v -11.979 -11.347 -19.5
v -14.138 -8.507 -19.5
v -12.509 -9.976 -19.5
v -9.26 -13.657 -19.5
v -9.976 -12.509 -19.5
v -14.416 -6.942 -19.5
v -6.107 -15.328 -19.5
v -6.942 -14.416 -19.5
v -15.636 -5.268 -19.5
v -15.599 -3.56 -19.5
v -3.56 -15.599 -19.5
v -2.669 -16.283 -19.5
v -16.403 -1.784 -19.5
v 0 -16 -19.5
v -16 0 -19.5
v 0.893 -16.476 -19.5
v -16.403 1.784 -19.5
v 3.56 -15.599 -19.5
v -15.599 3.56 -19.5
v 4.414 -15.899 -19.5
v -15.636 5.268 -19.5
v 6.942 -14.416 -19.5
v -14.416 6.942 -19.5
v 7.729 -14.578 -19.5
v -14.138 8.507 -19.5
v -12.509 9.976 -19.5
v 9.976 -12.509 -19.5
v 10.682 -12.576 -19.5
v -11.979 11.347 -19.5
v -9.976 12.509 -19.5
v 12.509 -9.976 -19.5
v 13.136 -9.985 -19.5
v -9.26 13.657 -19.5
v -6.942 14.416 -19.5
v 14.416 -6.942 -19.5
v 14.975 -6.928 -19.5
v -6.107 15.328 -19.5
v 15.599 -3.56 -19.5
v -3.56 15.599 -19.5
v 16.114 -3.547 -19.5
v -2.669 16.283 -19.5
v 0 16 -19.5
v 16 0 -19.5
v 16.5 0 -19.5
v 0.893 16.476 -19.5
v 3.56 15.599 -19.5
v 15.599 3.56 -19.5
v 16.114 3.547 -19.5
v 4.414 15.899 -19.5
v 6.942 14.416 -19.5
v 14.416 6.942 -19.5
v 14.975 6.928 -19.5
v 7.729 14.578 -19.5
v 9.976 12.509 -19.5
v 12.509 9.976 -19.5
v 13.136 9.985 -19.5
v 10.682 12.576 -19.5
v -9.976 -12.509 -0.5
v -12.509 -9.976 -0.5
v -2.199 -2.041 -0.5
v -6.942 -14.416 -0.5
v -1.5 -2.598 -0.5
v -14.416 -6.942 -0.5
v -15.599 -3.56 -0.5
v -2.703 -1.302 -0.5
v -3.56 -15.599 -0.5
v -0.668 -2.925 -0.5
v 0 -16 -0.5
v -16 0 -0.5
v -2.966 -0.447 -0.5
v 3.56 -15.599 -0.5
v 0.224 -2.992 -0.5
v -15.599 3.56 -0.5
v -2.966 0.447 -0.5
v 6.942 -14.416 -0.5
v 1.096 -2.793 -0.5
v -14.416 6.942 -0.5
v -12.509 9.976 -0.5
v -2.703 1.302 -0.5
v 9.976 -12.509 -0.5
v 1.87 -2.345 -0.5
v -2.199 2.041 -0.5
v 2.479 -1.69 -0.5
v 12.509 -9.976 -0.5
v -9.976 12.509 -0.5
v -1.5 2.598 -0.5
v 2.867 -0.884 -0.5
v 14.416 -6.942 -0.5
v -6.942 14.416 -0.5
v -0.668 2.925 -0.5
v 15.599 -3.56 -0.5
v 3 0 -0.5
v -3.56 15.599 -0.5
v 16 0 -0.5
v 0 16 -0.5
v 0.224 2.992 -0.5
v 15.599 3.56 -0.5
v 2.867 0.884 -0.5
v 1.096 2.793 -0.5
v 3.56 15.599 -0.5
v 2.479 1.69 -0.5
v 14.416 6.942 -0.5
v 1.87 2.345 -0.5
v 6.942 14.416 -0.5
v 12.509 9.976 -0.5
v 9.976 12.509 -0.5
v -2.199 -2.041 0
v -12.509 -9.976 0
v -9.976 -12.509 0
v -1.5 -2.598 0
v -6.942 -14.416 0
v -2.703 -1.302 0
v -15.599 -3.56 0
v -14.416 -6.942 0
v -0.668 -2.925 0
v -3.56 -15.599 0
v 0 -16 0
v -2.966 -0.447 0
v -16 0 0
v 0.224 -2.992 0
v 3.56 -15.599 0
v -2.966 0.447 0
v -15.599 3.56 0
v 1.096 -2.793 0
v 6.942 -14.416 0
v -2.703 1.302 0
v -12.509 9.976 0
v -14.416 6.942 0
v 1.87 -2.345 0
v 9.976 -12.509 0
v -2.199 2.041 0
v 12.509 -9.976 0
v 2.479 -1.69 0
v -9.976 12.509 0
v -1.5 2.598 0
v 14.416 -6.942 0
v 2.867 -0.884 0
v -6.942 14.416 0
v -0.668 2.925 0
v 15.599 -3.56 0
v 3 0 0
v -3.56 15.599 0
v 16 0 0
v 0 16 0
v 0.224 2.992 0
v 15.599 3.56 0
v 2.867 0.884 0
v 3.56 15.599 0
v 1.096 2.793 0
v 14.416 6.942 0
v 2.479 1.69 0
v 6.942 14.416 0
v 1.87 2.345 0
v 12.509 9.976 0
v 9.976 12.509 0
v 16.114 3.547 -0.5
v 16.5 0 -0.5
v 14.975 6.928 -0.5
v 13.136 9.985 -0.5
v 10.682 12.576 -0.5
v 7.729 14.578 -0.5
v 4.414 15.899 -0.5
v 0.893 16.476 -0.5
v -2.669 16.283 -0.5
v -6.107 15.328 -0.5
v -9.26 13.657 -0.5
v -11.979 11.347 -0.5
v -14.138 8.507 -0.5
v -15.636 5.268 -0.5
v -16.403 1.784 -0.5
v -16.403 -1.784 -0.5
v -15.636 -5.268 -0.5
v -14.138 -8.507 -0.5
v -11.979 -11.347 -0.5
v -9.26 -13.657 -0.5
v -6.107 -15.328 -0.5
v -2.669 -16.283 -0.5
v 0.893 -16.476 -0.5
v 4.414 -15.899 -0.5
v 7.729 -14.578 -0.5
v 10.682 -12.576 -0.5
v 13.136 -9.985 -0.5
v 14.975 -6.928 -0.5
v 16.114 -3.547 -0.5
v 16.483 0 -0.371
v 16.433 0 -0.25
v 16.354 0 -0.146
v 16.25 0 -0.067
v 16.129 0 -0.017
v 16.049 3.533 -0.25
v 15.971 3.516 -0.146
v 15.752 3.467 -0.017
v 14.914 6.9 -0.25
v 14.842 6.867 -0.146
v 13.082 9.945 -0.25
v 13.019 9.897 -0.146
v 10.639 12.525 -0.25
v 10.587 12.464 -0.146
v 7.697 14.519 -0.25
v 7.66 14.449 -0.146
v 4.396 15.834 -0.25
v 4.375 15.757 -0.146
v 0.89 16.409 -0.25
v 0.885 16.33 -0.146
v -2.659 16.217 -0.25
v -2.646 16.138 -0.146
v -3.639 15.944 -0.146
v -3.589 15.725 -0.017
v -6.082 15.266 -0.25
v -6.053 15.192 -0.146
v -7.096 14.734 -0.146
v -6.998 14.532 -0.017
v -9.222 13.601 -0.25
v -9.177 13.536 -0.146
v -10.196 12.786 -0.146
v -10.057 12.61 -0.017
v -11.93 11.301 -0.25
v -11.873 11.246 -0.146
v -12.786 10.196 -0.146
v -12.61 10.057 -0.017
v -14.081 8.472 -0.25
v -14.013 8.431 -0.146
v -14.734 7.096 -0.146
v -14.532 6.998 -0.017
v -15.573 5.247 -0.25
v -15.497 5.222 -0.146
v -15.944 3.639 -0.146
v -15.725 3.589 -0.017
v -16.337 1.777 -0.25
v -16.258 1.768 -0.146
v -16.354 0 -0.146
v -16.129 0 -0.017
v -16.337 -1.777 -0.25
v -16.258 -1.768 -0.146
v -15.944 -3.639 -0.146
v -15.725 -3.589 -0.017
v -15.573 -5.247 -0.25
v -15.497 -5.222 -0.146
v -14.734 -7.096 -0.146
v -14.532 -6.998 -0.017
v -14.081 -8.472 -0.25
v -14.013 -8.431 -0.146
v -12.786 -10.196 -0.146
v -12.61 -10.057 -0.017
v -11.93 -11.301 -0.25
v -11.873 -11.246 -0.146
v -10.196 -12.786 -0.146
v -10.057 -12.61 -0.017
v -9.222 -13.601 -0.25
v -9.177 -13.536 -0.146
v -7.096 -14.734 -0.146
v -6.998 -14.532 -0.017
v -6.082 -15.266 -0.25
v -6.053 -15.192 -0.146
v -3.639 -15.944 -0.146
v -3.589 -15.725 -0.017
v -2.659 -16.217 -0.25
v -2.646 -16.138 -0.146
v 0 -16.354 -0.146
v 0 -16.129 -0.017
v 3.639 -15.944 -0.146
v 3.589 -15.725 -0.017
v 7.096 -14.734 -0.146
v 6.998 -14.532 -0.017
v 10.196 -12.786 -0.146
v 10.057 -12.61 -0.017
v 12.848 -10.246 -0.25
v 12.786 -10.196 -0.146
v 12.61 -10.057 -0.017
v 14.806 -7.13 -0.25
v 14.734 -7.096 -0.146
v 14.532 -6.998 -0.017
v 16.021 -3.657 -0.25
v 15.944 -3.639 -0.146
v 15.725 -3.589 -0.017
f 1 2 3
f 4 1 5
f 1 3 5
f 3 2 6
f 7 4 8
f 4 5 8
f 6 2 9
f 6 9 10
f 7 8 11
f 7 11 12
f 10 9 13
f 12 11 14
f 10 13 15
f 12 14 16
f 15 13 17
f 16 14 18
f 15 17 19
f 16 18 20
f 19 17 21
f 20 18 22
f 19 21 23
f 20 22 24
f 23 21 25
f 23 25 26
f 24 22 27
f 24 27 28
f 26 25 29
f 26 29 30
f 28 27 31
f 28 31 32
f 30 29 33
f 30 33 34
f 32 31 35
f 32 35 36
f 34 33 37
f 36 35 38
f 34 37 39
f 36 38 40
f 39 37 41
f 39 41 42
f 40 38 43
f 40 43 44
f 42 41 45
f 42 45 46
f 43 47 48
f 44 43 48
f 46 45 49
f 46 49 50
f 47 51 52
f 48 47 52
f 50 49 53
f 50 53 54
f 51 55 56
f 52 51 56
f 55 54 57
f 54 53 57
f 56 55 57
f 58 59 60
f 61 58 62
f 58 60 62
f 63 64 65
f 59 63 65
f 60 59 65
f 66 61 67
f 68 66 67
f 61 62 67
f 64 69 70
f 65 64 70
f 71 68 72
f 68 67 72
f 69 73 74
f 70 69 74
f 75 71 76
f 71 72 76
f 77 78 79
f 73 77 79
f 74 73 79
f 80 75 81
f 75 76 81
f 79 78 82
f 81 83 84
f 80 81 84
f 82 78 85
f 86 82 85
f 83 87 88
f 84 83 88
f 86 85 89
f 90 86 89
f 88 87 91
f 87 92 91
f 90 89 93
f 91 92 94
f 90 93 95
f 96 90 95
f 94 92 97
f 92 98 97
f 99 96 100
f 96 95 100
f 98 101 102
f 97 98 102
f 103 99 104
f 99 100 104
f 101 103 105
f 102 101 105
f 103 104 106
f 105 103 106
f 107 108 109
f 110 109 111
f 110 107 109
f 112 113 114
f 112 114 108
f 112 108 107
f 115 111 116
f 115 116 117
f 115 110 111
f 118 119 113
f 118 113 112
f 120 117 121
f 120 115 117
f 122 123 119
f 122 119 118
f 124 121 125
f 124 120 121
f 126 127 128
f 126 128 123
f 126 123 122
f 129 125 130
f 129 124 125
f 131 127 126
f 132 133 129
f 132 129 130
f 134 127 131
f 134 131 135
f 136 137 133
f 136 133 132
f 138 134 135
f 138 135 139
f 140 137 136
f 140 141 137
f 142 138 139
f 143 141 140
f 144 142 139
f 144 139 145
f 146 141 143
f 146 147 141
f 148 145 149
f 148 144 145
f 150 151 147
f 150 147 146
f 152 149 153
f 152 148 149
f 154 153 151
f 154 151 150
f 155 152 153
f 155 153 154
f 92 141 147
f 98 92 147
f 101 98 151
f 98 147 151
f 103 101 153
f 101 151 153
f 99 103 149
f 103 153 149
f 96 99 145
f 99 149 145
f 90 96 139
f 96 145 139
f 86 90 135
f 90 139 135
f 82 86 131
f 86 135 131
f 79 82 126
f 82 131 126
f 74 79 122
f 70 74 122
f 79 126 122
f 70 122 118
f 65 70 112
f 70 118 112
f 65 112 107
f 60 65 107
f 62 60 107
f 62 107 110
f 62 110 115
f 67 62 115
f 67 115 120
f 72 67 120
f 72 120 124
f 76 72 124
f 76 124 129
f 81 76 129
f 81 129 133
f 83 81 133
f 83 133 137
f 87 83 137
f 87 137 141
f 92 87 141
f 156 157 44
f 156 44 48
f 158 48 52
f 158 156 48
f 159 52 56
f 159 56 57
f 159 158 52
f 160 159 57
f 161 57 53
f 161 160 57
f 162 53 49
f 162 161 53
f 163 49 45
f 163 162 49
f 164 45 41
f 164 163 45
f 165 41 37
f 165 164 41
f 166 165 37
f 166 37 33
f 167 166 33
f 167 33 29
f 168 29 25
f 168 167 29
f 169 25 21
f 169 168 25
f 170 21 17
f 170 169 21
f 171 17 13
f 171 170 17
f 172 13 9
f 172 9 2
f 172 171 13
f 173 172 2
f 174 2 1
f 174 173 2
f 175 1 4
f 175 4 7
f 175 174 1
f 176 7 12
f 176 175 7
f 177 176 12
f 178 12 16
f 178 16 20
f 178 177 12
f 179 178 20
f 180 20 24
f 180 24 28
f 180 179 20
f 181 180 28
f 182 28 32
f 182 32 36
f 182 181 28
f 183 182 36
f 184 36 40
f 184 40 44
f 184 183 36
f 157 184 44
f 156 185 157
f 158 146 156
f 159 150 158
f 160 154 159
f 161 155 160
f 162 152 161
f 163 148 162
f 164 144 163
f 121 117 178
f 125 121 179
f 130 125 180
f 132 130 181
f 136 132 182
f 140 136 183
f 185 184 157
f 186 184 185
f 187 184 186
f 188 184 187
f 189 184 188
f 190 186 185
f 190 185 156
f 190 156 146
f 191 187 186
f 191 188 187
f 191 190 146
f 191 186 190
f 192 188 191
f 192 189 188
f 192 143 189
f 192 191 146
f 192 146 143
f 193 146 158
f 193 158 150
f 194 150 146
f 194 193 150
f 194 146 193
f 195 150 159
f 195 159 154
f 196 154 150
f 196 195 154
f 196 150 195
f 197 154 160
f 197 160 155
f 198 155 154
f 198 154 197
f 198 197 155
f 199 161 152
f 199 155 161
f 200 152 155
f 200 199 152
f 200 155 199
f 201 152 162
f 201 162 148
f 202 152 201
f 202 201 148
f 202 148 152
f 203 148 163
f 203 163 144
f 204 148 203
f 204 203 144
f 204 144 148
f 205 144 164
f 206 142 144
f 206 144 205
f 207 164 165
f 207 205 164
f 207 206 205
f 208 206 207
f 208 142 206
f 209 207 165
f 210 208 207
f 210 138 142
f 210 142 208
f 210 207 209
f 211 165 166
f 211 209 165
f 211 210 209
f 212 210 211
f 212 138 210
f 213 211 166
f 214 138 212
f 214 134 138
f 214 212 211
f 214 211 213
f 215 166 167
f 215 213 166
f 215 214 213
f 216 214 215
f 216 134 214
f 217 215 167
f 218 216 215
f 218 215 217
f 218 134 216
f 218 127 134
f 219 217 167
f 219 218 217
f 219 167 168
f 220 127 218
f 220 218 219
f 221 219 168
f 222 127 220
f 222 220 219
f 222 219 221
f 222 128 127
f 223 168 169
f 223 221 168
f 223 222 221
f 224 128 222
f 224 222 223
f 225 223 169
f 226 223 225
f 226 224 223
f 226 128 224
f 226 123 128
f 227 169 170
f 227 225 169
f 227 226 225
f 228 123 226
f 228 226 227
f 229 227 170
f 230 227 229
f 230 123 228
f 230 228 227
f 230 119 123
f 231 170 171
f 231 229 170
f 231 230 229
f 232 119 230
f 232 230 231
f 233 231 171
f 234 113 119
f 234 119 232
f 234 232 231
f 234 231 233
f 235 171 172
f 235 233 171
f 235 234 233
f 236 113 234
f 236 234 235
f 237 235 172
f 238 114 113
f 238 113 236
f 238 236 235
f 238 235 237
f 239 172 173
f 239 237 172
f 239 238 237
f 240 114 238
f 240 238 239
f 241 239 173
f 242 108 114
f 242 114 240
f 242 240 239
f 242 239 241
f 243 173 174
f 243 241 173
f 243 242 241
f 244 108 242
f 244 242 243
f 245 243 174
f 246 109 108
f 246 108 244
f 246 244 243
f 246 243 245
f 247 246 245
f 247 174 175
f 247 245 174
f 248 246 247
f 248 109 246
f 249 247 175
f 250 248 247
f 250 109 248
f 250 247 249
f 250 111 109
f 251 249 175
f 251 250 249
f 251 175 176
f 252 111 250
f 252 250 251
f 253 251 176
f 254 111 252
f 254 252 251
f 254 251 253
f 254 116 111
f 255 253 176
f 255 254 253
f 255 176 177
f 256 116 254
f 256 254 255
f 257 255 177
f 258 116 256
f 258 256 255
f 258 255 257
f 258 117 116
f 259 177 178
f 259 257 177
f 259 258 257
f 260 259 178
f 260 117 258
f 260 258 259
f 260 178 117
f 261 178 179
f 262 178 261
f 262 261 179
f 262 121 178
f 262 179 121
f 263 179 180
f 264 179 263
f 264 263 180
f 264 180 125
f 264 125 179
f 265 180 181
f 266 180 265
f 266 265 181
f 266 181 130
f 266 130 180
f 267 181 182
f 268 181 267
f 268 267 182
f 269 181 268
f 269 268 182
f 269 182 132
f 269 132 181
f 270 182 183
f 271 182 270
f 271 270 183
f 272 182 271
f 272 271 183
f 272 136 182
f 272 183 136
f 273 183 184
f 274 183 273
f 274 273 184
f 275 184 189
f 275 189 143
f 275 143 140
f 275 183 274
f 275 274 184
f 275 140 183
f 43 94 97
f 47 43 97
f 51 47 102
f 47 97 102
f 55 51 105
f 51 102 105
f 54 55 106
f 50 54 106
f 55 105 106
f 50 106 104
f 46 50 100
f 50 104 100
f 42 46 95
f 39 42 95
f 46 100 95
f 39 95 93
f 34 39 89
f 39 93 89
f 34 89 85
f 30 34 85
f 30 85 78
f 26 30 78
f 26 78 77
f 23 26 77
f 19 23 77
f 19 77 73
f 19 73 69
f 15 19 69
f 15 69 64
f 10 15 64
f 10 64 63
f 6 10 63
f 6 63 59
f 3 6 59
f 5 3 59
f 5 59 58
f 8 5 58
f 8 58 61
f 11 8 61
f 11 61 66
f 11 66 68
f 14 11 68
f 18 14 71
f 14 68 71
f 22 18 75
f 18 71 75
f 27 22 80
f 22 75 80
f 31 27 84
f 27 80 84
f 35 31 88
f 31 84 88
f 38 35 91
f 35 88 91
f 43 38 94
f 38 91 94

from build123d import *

# Parameters (mm, degrees)
SKETCH1_R           = 16.5
BOSS_EXTRUDE1_DEPTH = 19.5
SHELL1_T            = -0.5
SKETCH2_R           = 3
CUT_EXTRUDE1_DEPTH  = 31.409702399
FILLET1_R           = 0.5


with BuildPart() as part:
    # Sketch1 → Boss-Extrude1 (new body)
    with BuildSketch(Plane.XY):
        Circle(SKETCH1_R)
    extrude(amount=-BOSS_EXTRUDE1_DEPTH)

    # Shell1
    shell1_openings = [part.faces().sort_by_distance(p)[0] for p in [
        (0, 0, -19.5),
    ]]
    offset(amount=SHELL1_T, openings=shell1_openings, kind=Kind.INTERSECTION)

    # Sketch2 → Cut-Extrude1 (cut, through all)
    with BuildSketch(Plane.XY):
        Circle(SKETCH2_R)
    extrude(amount=-CUT_EXTRUDE1_DEPTH, mode=Mode.SUBTRACT)

    # Fillet1
    fillet1_edges = [part.edges().sort_by_distance(p)[0] for p in [
        (-16.5, 0, 0),
    ]]
    fillet(fillet1_edges, radius=FILLET1_R)


solid = part.part
